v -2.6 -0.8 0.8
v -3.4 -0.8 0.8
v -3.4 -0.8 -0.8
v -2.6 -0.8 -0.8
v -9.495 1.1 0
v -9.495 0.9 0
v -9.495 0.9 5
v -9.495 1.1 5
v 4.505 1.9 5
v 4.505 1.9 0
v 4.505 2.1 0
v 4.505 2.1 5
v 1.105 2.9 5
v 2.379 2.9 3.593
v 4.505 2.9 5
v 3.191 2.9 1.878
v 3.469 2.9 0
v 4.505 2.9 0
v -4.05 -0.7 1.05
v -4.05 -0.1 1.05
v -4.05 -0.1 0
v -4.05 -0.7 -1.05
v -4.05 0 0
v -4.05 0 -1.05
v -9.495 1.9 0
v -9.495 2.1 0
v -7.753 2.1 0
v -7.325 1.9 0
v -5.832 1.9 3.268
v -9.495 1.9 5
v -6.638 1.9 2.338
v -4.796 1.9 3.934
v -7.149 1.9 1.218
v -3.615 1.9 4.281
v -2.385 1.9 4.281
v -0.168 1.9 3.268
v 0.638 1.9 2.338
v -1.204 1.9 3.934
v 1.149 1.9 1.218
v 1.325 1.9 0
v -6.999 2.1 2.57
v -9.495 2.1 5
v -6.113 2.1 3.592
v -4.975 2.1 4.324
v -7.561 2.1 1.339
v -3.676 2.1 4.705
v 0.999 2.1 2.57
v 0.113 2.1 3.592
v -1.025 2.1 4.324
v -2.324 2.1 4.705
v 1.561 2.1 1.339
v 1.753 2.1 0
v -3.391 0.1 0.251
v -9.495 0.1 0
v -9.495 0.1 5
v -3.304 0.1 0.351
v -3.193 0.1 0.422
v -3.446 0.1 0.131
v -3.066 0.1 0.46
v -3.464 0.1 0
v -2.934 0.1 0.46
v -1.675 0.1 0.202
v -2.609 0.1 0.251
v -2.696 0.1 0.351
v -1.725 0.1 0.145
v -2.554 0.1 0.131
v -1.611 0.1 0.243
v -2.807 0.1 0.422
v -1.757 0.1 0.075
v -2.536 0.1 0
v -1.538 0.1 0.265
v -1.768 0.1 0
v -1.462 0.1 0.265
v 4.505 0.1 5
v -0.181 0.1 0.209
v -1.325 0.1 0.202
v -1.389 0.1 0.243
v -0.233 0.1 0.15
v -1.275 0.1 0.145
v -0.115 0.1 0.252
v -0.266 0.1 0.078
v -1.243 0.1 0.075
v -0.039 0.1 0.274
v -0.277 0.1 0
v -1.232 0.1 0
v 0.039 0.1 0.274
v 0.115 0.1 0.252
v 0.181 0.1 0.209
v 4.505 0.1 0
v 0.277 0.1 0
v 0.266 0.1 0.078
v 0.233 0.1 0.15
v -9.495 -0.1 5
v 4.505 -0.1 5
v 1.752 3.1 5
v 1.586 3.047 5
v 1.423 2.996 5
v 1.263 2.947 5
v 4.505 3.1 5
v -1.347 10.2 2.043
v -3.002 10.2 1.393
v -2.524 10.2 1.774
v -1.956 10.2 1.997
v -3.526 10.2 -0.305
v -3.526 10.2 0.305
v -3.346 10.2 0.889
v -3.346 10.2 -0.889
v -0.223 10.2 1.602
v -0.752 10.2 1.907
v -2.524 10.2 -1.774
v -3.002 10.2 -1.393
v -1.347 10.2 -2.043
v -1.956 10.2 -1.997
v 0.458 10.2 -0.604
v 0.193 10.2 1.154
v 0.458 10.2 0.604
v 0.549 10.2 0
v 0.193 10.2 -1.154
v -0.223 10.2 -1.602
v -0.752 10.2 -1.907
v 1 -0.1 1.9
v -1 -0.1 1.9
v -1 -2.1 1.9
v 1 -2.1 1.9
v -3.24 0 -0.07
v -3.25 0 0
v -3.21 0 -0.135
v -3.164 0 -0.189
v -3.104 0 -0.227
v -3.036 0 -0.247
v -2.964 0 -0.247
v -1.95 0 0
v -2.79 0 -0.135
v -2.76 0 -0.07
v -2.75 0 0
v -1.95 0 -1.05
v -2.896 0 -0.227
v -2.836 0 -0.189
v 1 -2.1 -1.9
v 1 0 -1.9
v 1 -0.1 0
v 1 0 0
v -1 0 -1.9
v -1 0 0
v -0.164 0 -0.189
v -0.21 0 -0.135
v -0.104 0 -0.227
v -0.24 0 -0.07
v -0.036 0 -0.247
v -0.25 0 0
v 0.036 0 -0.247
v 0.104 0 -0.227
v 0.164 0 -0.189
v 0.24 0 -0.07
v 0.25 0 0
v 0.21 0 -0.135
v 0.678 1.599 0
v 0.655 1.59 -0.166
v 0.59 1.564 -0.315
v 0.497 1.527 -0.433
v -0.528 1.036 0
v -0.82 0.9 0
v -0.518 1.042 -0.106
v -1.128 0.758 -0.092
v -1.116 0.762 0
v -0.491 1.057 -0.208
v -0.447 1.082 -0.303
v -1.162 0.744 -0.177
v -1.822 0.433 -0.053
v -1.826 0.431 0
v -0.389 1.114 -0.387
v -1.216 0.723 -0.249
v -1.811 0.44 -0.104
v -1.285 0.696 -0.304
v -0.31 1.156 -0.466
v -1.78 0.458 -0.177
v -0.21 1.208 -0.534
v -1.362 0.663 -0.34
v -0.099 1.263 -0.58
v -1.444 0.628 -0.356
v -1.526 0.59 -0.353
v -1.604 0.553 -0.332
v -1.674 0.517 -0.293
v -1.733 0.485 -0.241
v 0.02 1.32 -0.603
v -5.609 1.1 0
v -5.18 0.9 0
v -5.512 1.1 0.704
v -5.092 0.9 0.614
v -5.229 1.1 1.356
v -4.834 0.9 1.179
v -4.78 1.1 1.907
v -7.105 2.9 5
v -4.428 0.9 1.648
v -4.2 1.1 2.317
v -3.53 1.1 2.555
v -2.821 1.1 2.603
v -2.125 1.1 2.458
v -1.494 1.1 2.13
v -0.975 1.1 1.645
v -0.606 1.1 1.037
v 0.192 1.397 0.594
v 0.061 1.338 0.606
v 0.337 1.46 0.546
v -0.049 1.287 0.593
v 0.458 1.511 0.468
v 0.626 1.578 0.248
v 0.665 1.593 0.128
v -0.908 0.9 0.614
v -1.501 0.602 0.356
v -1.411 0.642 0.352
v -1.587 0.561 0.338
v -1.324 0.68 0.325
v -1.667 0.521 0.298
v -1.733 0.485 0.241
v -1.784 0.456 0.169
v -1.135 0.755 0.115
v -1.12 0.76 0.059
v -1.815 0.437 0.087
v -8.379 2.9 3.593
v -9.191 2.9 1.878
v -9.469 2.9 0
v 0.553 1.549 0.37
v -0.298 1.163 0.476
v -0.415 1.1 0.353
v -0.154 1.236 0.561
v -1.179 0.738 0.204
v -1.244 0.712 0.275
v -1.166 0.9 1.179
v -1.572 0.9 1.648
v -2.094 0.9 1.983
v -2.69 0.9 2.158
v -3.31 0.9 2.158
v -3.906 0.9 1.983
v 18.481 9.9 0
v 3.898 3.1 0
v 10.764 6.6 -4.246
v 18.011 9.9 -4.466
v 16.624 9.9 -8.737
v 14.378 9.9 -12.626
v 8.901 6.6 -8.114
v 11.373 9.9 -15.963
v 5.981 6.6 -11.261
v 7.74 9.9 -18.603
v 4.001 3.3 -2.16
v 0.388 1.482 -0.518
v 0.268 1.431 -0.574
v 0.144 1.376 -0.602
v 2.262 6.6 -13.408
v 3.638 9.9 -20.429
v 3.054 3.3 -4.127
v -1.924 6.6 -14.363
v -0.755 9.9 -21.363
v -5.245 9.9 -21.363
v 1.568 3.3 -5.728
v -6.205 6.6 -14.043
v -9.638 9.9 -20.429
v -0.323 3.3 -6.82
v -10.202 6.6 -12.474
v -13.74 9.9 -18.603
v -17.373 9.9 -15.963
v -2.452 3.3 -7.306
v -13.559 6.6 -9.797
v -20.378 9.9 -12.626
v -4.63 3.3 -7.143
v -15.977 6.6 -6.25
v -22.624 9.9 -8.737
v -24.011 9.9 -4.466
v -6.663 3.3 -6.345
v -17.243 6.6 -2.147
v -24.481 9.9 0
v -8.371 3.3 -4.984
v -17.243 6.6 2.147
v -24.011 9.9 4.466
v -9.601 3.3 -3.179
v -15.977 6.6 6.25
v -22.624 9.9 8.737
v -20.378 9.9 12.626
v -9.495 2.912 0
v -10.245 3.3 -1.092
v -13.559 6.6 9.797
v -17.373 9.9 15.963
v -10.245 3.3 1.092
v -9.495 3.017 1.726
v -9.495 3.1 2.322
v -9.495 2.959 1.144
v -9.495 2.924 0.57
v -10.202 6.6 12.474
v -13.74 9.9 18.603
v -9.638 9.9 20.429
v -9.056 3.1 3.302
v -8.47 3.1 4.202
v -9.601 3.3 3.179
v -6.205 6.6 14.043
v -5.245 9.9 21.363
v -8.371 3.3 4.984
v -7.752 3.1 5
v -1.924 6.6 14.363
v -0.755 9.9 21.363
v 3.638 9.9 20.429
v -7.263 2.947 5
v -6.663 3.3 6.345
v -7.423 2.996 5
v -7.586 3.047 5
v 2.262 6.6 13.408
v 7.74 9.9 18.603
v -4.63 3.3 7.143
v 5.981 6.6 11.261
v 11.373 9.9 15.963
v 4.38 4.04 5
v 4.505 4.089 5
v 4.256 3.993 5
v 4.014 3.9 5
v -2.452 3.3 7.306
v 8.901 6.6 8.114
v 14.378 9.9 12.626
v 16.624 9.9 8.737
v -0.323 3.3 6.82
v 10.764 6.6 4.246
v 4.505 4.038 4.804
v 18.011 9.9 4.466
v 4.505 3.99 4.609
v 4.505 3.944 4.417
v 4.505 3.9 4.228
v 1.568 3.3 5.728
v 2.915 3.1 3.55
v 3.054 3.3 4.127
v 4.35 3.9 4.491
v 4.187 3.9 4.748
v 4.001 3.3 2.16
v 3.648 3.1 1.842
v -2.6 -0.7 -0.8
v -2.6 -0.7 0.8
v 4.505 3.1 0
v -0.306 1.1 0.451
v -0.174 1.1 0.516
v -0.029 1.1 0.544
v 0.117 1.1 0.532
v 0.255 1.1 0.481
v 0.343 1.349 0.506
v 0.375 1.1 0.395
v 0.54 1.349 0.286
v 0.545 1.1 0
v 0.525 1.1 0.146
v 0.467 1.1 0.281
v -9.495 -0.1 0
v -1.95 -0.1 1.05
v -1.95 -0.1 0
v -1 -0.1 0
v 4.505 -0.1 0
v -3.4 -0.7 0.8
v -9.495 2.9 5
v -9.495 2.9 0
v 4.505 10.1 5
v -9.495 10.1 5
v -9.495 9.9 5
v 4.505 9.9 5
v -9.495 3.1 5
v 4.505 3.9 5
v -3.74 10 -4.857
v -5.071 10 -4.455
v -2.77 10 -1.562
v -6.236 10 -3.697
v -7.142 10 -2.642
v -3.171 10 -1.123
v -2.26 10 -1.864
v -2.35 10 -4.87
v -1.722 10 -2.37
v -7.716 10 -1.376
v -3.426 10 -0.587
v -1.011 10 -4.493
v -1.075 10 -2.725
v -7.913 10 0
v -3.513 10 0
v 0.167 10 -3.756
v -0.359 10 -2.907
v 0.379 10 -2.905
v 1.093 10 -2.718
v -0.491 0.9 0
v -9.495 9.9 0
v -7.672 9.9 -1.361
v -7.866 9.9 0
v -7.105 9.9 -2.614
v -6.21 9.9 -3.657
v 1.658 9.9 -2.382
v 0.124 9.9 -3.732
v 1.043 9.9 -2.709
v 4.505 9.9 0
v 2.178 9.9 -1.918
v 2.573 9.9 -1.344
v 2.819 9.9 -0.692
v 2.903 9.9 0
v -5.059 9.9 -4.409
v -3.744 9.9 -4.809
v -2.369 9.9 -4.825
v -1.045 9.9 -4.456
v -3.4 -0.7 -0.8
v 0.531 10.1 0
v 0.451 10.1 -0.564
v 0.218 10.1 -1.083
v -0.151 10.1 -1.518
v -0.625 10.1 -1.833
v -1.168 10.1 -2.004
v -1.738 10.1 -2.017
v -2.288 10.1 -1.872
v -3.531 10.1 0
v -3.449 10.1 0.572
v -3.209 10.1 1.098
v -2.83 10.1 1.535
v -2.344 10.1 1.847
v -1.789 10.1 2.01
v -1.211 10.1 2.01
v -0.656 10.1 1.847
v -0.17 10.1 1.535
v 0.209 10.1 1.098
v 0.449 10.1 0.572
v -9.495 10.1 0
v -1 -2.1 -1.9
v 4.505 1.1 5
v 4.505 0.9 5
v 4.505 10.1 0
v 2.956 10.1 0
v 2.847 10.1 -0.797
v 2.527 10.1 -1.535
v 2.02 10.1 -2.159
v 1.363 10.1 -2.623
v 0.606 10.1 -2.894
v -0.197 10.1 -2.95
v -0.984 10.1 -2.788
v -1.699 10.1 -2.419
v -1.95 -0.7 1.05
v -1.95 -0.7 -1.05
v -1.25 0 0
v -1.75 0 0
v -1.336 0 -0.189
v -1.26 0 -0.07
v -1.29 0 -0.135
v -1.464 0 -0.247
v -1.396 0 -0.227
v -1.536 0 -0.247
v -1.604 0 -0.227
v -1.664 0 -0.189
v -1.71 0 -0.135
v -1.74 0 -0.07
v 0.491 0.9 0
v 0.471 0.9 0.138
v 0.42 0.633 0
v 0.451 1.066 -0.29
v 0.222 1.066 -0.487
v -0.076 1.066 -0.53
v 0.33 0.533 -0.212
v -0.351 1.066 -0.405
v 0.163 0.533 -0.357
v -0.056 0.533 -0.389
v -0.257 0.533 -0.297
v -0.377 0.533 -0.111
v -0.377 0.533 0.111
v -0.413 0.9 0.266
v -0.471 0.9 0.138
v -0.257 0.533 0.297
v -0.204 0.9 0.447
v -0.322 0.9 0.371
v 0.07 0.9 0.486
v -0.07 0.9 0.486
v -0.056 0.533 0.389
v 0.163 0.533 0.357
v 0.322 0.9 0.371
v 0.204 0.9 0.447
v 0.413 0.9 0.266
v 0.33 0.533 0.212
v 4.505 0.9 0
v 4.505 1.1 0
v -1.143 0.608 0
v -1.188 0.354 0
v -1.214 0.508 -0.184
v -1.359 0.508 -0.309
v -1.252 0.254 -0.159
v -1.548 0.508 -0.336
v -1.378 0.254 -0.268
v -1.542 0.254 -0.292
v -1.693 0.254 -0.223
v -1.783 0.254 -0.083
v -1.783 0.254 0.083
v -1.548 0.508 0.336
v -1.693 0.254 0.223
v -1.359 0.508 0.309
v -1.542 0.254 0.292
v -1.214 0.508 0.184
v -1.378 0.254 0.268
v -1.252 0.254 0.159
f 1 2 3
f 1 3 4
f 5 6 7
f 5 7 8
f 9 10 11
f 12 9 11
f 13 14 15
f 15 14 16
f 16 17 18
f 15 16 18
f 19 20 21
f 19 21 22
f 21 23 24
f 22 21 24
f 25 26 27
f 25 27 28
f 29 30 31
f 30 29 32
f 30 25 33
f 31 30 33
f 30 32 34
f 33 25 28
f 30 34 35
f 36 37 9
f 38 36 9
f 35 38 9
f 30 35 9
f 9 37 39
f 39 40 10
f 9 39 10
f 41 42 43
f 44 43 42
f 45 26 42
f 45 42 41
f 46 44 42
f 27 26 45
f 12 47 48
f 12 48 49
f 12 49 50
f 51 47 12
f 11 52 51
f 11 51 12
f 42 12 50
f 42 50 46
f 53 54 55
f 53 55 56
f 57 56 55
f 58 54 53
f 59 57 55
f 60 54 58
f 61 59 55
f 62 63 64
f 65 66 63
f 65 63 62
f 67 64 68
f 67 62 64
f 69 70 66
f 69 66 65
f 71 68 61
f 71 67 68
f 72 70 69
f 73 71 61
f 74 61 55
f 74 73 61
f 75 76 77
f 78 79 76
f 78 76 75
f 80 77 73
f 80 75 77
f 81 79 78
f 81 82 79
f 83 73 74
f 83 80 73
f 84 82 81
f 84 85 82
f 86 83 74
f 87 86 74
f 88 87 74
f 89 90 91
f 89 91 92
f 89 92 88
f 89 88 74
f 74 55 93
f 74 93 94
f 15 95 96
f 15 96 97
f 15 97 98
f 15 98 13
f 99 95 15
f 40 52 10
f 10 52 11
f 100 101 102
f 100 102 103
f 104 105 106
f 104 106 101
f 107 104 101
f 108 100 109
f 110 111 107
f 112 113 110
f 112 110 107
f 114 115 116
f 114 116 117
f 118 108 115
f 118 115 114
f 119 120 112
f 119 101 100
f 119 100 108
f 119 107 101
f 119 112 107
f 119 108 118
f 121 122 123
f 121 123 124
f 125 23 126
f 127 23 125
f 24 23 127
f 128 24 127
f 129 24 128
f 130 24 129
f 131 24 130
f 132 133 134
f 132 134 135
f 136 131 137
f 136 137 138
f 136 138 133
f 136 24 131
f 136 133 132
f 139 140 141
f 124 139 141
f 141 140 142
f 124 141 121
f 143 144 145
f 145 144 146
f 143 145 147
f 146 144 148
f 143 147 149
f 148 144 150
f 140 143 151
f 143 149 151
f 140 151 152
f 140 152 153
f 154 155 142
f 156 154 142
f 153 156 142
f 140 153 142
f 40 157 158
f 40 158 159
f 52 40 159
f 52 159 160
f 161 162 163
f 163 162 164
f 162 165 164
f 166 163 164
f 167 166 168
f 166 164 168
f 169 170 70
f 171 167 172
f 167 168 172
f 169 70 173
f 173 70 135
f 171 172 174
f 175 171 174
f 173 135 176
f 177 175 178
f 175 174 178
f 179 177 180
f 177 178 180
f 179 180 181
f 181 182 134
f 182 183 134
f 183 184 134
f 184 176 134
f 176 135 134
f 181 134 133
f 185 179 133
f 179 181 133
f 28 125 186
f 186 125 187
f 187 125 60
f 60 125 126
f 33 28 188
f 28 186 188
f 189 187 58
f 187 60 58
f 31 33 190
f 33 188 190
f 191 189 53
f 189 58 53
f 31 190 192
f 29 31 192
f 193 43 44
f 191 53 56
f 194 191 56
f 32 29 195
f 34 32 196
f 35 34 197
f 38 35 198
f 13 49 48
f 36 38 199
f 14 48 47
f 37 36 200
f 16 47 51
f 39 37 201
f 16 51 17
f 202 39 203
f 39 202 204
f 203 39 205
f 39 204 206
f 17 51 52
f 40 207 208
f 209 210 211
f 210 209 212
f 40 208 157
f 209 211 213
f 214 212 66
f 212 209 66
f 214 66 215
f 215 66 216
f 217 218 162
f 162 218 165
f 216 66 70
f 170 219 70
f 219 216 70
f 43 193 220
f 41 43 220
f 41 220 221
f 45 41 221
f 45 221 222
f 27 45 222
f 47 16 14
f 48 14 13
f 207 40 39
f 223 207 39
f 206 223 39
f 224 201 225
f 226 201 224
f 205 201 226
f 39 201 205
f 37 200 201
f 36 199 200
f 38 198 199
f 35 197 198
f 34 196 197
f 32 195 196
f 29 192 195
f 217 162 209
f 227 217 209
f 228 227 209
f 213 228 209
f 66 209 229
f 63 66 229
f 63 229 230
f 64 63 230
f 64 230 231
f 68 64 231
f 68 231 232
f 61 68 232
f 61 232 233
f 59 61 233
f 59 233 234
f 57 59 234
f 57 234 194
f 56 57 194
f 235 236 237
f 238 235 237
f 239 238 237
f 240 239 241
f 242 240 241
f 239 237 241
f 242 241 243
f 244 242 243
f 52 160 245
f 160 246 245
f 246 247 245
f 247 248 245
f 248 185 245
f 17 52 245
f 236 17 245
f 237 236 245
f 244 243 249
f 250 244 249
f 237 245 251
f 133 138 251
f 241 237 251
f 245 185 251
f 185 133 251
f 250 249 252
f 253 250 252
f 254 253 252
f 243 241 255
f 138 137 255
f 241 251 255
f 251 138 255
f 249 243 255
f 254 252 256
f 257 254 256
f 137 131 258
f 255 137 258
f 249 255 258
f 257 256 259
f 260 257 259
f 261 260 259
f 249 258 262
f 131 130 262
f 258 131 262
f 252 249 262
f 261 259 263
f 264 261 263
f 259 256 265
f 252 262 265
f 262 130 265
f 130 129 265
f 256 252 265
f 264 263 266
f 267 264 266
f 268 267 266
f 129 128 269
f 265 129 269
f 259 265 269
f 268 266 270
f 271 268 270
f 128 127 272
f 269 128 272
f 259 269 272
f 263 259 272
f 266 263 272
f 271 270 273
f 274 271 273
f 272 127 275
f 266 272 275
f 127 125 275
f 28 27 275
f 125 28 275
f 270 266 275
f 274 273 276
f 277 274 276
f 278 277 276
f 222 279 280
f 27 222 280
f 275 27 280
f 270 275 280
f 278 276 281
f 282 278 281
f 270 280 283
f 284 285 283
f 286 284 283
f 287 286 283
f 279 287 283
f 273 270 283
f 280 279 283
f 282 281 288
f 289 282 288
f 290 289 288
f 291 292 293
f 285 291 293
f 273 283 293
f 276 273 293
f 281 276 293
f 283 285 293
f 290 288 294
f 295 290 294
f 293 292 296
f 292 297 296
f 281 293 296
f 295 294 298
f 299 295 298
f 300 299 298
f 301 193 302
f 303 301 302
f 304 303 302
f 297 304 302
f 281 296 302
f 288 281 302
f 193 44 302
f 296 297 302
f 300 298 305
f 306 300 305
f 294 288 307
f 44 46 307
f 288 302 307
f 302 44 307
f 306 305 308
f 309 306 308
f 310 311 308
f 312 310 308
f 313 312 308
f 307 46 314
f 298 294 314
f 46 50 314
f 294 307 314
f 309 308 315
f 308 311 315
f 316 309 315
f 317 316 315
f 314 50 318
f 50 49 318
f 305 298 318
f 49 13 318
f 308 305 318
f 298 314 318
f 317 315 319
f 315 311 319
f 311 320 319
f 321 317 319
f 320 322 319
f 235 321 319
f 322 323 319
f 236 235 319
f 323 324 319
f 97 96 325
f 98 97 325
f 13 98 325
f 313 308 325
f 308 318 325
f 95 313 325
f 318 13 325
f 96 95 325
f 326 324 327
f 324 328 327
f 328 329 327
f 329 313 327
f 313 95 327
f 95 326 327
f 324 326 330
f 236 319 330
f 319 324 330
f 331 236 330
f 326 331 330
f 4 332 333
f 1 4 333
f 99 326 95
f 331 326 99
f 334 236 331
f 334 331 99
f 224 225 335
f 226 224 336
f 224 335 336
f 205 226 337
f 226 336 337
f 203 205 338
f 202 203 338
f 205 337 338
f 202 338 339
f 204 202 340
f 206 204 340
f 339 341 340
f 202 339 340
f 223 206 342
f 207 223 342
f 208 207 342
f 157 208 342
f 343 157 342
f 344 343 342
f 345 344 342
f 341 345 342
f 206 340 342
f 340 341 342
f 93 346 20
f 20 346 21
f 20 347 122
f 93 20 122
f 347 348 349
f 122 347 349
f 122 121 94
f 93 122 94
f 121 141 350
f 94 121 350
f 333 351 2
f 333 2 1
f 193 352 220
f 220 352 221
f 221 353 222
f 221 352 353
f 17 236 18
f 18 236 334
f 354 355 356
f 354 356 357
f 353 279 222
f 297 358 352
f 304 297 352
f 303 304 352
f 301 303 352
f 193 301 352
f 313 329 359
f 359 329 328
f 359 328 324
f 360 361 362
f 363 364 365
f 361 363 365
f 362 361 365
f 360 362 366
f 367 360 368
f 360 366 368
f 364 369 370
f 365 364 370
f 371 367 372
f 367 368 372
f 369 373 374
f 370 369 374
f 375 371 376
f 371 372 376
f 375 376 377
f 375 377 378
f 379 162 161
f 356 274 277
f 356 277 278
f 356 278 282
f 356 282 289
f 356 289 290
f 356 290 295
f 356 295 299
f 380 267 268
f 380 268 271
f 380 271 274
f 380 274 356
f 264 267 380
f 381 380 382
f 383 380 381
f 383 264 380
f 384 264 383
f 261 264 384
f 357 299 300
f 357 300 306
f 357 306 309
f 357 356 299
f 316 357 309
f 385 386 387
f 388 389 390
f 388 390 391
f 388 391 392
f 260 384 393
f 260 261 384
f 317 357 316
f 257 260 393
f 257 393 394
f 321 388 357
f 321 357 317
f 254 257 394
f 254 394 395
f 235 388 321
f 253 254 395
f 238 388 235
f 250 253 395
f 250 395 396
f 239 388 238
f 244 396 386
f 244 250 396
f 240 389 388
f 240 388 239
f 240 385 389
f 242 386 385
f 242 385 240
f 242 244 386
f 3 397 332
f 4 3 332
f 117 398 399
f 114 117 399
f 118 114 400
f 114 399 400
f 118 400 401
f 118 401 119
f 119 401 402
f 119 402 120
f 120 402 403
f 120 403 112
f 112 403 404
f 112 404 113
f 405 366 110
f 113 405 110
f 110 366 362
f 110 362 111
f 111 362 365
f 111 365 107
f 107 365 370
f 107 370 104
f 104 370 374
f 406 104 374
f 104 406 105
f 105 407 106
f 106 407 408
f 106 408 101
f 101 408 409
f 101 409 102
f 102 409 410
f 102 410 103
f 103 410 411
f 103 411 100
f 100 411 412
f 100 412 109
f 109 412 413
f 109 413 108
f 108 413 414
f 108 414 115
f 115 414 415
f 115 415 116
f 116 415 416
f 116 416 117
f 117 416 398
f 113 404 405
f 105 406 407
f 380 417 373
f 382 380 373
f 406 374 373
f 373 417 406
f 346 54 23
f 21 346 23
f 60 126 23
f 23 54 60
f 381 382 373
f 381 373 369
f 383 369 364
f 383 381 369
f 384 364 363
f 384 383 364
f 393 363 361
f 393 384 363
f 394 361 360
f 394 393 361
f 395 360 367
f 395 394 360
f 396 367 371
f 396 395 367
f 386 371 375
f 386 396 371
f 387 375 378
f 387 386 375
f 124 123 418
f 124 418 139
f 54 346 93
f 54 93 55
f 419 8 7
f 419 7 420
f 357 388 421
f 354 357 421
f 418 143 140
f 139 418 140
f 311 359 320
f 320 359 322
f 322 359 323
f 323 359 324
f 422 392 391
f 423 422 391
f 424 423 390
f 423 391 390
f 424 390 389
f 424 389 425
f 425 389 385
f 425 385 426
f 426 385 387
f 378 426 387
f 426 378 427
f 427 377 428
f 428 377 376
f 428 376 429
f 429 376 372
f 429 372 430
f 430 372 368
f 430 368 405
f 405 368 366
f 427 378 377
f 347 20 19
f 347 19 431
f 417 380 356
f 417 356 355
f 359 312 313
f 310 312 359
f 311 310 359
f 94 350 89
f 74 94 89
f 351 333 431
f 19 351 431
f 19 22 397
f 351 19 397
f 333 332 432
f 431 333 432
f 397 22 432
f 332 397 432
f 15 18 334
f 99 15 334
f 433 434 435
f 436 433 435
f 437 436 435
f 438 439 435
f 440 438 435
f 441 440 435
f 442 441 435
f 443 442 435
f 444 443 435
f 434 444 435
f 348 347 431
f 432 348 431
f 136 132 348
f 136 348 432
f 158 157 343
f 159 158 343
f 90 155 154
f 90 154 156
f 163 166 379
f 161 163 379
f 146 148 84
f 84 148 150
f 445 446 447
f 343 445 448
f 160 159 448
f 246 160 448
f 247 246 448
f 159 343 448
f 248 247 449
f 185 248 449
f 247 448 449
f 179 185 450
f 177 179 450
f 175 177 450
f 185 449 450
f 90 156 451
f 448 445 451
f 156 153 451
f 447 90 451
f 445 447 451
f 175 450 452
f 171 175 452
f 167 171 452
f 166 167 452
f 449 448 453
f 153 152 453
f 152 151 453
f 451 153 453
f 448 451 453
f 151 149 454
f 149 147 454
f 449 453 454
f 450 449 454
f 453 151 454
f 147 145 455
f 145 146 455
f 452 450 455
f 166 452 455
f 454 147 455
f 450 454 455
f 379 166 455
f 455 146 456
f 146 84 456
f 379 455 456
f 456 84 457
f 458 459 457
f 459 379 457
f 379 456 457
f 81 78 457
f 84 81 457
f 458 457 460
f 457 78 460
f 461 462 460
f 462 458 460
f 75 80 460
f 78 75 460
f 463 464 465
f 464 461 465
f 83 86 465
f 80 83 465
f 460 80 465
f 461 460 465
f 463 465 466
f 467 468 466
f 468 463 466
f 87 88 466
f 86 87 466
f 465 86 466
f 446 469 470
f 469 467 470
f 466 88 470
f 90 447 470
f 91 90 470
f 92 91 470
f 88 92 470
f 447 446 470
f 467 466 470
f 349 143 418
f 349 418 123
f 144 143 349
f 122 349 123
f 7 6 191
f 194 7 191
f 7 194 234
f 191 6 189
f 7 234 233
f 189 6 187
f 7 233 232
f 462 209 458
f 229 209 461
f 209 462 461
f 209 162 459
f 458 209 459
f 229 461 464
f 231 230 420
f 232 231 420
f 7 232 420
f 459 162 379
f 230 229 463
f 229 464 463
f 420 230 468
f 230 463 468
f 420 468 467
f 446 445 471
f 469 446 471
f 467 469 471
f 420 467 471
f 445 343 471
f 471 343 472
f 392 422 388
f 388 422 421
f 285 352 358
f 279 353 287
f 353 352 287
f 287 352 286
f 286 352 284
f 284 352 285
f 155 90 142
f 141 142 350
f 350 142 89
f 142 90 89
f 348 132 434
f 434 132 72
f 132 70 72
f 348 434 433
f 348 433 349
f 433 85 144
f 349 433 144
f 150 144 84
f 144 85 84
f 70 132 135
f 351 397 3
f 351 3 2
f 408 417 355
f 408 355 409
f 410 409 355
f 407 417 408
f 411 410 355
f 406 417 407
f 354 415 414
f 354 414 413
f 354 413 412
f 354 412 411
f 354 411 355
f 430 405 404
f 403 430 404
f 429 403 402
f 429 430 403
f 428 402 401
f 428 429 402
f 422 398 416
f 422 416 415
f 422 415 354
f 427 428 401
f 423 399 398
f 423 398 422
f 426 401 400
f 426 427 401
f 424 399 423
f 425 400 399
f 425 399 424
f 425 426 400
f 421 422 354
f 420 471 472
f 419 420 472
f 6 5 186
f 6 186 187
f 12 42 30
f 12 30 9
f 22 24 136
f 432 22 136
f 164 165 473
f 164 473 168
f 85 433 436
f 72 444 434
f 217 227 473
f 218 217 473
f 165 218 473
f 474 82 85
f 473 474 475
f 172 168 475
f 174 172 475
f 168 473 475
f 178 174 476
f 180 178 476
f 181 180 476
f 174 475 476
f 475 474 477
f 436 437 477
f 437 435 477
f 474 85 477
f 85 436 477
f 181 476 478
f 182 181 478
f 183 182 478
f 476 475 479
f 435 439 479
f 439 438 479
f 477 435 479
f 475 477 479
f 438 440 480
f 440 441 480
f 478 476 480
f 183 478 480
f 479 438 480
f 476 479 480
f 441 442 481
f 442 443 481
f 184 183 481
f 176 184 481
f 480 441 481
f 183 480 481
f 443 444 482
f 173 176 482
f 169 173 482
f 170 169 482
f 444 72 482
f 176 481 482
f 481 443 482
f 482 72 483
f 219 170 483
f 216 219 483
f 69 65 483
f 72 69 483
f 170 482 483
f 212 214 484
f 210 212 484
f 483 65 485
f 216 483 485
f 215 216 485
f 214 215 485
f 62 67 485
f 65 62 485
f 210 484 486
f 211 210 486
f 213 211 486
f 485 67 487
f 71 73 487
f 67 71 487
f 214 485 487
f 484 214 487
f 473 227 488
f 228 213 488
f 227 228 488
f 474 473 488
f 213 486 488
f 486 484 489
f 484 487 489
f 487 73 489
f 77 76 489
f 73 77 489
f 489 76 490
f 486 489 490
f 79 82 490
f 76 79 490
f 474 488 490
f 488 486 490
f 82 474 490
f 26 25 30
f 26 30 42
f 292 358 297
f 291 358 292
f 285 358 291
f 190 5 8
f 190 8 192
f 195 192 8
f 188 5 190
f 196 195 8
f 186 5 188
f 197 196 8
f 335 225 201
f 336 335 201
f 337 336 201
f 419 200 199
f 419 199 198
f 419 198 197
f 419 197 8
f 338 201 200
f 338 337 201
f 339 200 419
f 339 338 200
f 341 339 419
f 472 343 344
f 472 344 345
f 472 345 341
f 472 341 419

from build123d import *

# Parameters (mm, degrees)
SKETCH1_R           = 0.25
BOSS_EXTRUDE1_DEPTH = 10.1
BOSS_EXTRUDE1_DRAFT = -15
SKETCH2_R           = 0.25
BOSS_EXTRUDE2_DEPTH = 10
BOSS_EXTRUDE2_DRAFT = 25
SKETCH3_W           = 14
SKETCH3_H           = 0.2
EXTRUDE_THIN1_DEPTH = 5
SKETCH4_W           = 2.1
SKETCH4_H           = 2.1
BOSS_EXTRUDE3_DEPTH = 0.7
SKETCH5_W           = 2
SKETCH5_H           = 3.8
BOSS_EXTRUDE4_DEPTH = 2.1
SKETCH7_R           = 0.25
BOSS_EXTRUDE5_DEPTH = 9.9
BOSS_EXTRUDE5_DRAFT = -65
SKETCH8_W           = 0.8
SKETCH8_H           = 1.6
BOSS_EXTRUDE6_DEPTH = 0.8
SKETCH9_R           = 0.25
BOSS_EXTRUDE7_DEPTH = 10.2
BOSS_EXTRUDE7_DRAFT = -10


with BuildPart() as part:
    # Sketch1 → Boss-Extrude1 (with draft: the straight prism first)
    with BuildSketch(Plane(origin=(0, 0, 0), x_dir=(1, 0, 0), z_dir=(0, 1, 0))):
        Circle(SKETCH1_R)
    extrude(amount=BOSS_EXTRUDE1_DEPTH)
    # Boss-Extrude1: the draft: its side faces are tilted about the plane it starts from
    boss_extrude1_sides = [part.faces().sort_by_distance(p)[0] for p in [
        (-0.25, 5.05, 0),
    ]]
    draft(boss_extrude1_sides, Plane(origin=(0, 0, 0), x_dir=(1, 0, 0), z_dir=(0, 1, 0)), BOSS_EXTRUDE1_DRAFT)



with BuildPart() as body_2:
    # Sketch2 → Boss-Extrude2 (with draft: the straight prism first)
    with BuildSketch(Plane.XZ):
        with Locations((-3, 0)):
            Circle(SKETCH2_R)
    extrude(amount=-BOSS_EXTRUDE2_DEPTH)
    # Boss-Extrude2: the draft: its side faces are tilted about the plane it starts from
    boss_extrude2_sides = [body_2.faces().sort_by_distance(p)[0] for p in [
        (-3.25, 5, 0),
    ]]
    draft(boss_extrude2_sides, Plane.XZ, BOSS_EXTRUDE2_DRAFT)


with BuildPart() as part_1:
    add(part.part)

    add(body_2.part)  # Extrude-Thin1 merges body 2
    # Sketch3 → Extrude-Thin1 (add)
    with BuildSketch(Plane.XY):
        with Locations((-2.495263261, 0)):
            Rectangle(SKETCH3_W, SKETCH3_H)
        with Locations((-2.495263261, 1)):
            Rectangle(SKETCH3_W, SKETCH3_H)
        with Locations((-2.495263261, 2)):
            Rectangle(SKETCH3_W, SKETCH3_H)
        with Locations((-2.495263261, 3)):
            Rectangle(SKETCH3_W, SKETCH3_H)
        with Locations((-2.495263261, 4)):
            Rectangle(SKETCH3_W, SKETCH3_H)
        with Locations((-2.495263261, 5)):
            Rectangle(SKETCH3_W, SKETCH3_H)
        with Locations((-2.495263261, 6)):
            Rectangle(SKETCH3_W, SKETCH3_H)
        with Locations((-2.495263261, 7)):
            Rectangle(SKETCH3_W, SKETCH3_H)
        with Locations((-2.495263261, 8)):
            Rectangle(SKETCH3_W, SKETCH3_H)
        with Locations((-2.495263261, 9)):
            Rectangle(SKETCH3_W, SKETCH3_H)
        with Locations((-2.495263261, 10)):
            Rectangle(SKETCH3_W, SKETCH3_H)
    extrude(amount=EXTRUDE_THIN1_DEPTH)

    # Sketch4 → Boss-Extrude3 (add)
    with BuildSketch(Plane(origin=(0, 0, 0), x_dir=(1, 0, 0), z_dir=(0, 1, 0))):
        with Locations((-3, 0)):
            Rectangle(SKETCH4_W, SKETCH4_H)
    extrude(amount=-BOSS_EXTRUDE3_DEPTH)

    # Sketch5 → Boss-Extrude4 (add)
    with BuildSketch(Plane.XZ):
        Rectangle(SKETCH5_W, SKETCH5_H)
    extrude(amount=BOSS_EXTRUDE4_DEPTH)


with BuildPart() as boss_extrude5_tool:
    # Sketch7 → Boss-Extrude5 (with draft: the straight prism first)
    with BuildSketch(Plane(origin=(0, 0, 0), x_dir=(1, 0, 0), z_dir=(0, 1, 0))):
        with Locations((-3, 0)):
            Circle(SKETCH7_R)
    extrude(amount=BOSS_EXTRUDE5_DEPTH)
    # Boss-Extrude5: the draft: its side faces are tilted about the plane it starts from
    boss_extrude5_sides = [boss_extrude5_tool.faces().sort_by_distance(p)[0] for p in [
        (-3.25, 4.95, 0),
    ]]
    draft(boss_extrude5_sides, Plane(origin=(0, 0, 0), x_dir=(1, 0, 0), z_dir=(0, 1, 0)), BOSS_EXTRUDE5_DRAFT)


with BuildPart() as part_2:
    add(part_1.part)

    # Boss-Extrude5: add boss_extrude5_tool
    add(boss_extrude5_tool.part)

    # Sketch8 → Boss-Extrude6 (add)
    with BuildSketch(Plane.XZ):
        with Locations((-3, 0)):
            Rectangle(SKETCH8_W, SKETCH8_H)
    extrude(amount=BOSS_EXTRUDE6_DEPTH)


with BuildPart() as boss_extrude7_tool:
    # Sketch9 → Boss-Extrude7 (with draft: the straight prism first)
    with BuildSketch(Plane(origin=(0, 0, 0), x_dir=(1, 0, 0), z_dir=(0, 1, 0))):
        with Locations((-1.5, 0)):
            Circle(SKETCH9_R)
    extrude(amount=BOSS_EXTRUDE7_DEPTH)
    # Boss-Extrude7: the draft: its side faces are tilted about the plane it starts from
    boss_extrude7_sides = [boss_extrude7_tool.faces().sort_by_distance(p)[0] for p in [
        (-1.75, 5.1, 0),
    ]]
    draft(boss_extrude7_sides, Plane(origin=(0, 0, 0), x_dir=(1, 0, 0), z_dir=(0, 1, 0)), BOSS_EXTRUDE7_DRAFT)


with BuildPart() as part_3:
    add(part_2.part)

    # Boss-Extrude7: add boss_extrude7_tool
    add(boss_extrude7_tool.part)


solid = part_3.part
